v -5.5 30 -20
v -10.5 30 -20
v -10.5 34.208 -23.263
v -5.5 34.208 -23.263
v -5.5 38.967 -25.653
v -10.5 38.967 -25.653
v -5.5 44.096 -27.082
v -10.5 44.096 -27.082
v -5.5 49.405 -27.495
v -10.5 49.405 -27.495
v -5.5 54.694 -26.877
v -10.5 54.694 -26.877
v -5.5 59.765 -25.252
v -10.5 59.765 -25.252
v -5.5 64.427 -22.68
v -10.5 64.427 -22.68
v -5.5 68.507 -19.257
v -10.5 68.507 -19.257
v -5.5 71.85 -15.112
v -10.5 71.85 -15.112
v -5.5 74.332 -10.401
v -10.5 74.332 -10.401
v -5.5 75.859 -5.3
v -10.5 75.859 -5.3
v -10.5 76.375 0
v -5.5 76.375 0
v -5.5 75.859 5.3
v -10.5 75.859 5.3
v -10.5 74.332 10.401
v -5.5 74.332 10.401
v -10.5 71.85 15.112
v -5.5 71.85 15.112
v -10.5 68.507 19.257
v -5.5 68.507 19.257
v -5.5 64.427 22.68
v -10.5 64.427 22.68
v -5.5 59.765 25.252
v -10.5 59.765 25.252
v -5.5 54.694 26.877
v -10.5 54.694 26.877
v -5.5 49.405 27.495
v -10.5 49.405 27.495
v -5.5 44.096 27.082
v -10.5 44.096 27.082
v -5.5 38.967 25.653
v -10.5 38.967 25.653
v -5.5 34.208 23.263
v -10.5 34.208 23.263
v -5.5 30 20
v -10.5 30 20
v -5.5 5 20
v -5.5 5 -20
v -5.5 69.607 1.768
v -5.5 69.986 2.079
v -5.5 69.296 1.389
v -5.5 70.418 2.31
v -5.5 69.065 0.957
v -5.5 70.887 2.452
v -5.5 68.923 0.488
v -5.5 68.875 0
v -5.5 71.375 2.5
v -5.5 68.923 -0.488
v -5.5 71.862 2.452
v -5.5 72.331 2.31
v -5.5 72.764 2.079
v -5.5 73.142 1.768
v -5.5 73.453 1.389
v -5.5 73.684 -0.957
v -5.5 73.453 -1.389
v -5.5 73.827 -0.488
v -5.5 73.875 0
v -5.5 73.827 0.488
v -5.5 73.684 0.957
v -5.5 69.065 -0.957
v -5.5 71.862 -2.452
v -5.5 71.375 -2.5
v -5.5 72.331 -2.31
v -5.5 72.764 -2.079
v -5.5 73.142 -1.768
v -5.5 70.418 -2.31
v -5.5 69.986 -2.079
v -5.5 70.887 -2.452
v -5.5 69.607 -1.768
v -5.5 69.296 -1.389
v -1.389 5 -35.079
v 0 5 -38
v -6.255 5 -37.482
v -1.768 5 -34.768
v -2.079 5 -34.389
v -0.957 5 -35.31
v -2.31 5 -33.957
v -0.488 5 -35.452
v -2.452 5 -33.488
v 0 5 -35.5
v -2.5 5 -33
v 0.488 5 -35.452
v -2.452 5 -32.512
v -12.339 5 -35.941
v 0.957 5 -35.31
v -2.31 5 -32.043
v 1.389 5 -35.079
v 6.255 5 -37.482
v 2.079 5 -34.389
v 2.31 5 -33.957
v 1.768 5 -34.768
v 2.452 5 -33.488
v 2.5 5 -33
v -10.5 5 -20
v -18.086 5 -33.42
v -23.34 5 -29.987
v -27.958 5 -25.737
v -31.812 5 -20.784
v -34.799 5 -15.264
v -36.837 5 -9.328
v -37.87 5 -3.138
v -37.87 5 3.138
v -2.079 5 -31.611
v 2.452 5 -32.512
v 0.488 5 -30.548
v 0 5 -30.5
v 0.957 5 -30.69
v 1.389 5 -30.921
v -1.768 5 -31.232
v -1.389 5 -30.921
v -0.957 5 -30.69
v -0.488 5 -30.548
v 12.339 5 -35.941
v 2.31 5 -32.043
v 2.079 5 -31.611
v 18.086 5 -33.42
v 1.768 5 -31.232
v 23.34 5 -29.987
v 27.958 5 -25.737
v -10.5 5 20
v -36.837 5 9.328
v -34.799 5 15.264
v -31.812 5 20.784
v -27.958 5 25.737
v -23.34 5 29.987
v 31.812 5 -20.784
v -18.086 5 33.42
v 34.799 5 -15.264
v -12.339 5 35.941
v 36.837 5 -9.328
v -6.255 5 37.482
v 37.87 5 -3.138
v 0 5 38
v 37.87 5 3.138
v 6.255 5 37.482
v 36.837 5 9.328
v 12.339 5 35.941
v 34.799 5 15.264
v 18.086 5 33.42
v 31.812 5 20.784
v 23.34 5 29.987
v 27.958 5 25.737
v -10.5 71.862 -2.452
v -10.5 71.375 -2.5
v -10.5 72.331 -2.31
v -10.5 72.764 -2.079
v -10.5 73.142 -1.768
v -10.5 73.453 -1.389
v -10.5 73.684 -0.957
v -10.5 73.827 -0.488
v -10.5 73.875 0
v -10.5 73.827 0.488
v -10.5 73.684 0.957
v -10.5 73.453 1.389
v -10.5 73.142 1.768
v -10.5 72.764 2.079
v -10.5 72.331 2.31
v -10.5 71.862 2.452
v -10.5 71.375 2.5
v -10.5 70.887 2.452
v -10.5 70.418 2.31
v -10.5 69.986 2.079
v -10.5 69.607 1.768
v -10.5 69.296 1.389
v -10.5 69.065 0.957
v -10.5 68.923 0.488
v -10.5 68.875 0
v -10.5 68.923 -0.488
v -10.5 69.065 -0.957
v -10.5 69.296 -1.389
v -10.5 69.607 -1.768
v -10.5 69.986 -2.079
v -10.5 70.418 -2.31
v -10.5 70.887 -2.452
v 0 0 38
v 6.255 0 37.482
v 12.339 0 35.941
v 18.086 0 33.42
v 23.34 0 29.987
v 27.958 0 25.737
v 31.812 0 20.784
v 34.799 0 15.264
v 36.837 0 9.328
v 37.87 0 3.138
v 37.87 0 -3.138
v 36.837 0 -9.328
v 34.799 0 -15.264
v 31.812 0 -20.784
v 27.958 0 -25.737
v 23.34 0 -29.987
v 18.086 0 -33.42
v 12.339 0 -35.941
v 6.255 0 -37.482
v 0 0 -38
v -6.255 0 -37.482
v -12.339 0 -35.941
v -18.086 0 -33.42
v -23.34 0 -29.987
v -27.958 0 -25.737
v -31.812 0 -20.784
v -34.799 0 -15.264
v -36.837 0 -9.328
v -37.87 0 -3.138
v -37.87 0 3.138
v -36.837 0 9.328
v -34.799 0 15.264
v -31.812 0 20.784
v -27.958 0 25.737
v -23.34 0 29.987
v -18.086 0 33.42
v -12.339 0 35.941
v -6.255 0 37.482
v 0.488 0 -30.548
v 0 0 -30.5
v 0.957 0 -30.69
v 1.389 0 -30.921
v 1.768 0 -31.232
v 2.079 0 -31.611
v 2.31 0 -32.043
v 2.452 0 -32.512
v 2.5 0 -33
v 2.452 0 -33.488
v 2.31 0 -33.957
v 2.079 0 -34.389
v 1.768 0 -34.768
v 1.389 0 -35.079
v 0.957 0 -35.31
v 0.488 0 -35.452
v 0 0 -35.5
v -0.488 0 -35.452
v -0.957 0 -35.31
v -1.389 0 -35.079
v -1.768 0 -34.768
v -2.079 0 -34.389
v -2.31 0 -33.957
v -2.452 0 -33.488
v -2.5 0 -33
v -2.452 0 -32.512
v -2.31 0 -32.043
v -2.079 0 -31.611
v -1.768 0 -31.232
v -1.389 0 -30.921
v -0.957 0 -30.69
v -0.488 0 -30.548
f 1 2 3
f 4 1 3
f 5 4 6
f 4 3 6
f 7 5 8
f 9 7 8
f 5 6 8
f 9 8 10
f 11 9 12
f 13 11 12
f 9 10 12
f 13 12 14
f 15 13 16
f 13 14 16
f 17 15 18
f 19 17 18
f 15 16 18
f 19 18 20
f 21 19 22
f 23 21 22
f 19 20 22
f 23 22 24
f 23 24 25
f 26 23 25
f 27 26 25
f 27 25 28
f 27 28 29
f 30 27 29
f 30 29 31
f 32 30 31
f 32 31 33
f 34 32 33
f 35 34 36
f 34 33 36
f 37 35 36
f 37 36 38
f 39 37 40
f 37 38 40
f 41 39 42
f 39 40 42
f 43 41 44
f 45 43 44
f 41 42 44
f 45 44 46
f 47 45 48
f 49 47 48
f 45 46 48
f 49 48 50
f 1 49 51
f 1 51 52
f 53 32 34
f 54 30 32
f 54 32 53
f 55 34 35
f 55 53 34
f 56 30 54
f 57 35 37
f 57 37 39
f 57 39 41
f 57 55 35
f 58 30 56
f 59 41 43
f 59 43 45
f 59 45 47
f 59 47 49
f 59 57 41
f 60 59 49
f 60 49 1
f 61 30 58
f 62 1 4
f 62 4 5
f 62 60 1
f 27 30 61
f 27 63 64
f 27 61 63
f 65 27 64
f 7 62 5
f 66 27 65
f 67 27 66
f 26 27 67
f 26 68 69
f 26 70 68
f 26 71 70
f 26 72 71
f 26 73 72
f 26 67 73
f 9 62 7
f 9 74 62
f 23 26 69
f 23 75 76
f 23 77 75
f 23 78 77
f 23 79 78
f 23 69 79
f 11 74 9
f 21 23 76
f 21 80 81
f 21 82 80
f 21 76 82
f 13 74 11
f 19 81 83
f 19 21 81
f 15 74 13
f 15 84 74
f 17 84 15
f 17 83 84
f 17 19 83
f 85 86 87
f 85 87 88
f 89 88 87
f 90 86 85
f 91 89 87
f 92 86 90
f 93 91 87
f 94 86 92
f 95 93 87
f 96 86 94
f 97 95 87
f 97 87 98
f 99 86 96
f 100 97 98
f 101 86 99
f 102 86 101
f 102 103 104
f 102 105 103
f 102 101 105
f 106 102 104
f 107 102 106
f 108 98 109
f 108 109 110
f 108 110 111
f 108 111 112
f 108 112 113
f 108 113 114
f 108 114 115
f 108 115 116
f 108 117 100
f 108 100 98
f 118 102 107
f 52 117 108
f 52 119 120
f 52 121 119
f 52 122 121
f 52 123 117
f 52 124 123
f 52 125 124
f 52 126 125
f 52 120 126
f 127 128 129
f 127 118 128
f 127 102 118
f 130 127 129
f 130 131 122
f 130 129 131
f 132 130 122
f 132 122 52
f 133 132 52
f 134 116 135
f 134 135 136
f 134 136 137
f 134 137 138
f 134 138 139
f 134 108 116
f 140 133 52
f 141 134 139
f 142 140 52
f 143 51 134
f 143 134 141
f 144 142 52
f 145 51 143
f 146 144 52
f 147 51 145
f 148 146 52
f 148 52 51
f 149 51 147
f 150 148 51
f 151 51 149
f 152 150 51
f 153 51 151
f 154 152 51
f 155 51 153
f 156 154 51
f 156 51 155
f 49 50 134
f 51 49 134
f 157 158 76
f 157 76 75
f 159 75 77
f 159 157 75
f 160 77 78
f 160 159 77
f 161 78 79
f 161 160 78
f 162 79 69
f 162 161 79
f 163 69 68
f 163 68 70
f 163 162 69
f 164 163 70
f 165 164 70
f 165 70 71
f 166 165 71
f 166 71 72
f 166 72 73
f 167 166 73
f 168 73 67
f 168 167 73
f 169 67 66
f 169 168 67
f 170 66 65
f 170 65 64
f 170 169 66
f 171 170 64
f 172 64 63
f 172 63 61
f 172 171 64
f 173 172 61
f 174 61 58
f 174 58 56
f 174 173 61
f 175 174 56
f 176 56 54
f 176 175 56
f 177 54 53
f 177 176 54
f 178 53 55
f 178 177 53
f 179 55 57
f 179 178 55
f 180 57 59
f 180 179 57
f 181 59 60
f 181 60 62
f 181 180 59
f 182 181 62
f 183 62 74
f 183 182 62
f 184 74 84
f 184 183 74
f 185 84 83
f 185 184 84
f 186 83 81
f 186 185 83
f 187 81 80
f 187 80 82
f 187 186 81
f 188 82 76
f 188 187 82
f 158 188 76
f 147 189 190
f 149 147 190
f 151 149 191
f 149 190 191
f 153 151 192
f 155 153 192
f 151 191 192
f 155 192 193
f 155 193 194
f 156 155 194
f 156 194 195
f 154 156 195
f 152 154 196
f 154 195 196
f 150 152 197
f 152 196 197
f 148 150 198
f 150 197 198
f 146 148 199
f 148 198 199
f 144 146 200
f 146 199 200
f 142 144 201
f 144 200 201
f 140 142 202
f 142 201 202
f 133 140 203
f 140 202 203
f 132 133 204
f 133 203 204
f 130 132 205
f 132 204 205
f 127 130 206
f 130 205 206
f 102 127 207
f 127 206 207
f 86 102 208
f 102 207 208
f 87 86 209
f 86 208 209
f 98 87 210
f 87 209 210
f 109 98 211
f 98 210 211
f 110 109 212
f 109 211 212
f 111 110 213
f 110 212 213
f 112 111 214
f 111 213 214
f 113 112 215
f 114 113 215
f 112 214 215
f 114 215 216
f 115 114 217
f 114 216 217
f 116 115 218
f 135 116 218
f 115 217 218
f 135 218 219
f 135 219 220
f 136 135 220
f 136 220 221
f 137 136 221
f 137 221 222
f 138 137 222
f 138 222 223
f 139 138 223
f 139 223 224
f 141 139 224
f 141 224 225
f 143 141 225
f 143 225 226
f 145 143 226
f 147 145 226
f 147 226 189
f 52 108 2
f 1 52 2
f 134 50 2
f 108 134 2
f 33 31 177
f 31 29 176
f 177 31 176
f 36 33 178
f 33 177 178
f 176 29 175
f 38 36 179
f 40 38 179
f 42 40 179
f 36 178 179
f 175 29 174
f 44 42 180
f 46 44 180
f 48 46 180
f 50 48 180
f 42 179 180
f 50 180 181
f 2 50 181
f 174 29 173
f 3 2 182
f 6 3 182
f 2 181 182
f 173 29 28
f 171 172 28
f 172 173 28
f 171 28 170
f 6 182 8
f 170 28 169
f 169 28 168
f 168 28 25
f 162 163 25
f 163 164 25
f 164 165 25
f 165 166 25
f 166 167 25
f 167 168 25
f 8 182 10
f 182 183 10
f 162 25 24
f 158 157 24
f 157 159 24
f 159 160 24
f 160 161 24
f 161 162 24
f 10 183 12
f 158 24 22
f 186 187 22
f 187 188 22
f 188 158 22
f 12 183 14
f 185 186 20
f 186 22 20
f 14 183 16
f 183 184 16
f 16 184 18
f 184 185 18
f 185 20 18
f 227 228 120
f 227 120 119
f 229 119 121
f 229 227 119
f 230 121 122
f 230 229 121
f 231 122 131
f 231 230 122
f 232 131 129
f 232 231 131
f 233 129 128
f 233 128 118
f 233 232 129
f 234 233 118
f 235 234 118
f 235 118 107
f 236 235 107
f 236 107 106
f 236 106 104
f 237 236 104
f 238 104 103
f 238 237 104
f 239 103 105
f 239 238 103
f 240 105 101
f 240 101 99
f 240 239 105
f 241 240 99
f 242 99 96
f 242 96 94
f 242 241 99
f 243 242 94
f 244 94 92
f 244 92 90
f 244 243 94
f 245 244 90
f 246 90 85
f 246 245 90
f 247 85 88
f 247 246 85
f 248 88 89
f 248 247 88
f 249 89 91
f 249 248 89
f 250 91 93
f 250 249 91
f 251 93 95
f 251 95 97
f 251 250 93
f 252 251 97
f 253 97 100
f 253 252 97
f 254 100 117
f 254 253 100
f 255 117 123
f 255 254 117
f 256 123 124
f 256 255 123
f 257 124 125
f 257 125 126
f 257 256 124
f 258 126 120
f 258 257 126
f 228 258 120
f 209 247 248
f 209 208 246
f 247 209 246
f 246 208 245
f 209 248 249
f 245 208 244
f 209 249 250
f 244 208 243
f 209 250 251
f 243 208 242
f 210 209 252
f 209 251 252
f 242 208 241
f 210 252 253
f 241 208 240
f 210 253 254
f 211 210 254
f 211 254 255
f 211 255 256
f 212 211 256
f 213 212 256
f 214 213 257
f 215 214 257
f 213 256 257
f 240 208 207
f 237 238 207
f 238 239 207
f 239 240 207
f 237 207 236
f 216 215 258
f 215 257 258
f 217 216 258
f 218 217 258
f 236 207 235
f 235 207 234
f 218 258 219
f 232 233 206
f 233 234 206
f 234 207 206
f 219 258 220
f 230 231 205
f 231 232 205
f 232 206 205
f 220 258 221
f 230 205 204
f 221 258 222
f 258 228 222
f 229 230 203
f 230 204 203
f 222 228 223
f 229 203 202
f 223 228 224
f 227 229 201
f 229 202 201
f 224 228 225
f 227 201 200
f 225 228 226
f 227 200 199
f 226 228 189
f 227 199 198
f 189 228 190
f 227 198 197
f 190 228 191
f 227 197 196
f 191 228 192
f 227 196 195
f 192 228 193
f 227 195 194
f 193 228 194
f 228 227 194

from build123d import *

# Parameters (mm, degrees)
SKETCH_1_R      = 38
SKETCH_1_R_2    = 2.5
EXTRUDE_1_DEPTH = 5
SKETCH_5_R      = 2.5
EXTRUDE_3_DEPTH = 5


with BuildPart() as part:
    # 草图1 → 凸台-拉伸1 (new body)
    with BuildSketch(Plane(origin=(0, 0, 0), x_dir=(1, 0, 0), z_dir=(0, 1, 0))):
        with Locations(Location((0, 0, 0), (0, 0, 270))):
            Circle(SKETCH_1_R)
        with Locations(Location((0, 33, 0), (0, 0, 270))):
            Circle(SKETCH_1_R_2, mode=Mode.SUBTRACT)
    extrude(amount=EXTRUDE_1_DEPTH)

    # 草图5 → 凸台-拉伸3 (add)
    with BuildSketch(Plane(origin=(-10.5, 0, 0), x_dir=(0, 0, -1), z_dir=(1, 0, 0))):
        with BuildLine():
            Line((-20, 30), (-20, 5))
            Line((-20, 5), (20, 5))
            Line((20, 5), (20, 30))
            ThreePointArc((20, 30), (0, 76.374586088), (-20, 30))
        make_face()
        with Locations((0, 71.374586088)):
            Circle(SKETCH_5_R, mode=Mode.SUBTRACT)
    extrude(amount=EXTRUDE_3_DEPTH)


solid = part.part
